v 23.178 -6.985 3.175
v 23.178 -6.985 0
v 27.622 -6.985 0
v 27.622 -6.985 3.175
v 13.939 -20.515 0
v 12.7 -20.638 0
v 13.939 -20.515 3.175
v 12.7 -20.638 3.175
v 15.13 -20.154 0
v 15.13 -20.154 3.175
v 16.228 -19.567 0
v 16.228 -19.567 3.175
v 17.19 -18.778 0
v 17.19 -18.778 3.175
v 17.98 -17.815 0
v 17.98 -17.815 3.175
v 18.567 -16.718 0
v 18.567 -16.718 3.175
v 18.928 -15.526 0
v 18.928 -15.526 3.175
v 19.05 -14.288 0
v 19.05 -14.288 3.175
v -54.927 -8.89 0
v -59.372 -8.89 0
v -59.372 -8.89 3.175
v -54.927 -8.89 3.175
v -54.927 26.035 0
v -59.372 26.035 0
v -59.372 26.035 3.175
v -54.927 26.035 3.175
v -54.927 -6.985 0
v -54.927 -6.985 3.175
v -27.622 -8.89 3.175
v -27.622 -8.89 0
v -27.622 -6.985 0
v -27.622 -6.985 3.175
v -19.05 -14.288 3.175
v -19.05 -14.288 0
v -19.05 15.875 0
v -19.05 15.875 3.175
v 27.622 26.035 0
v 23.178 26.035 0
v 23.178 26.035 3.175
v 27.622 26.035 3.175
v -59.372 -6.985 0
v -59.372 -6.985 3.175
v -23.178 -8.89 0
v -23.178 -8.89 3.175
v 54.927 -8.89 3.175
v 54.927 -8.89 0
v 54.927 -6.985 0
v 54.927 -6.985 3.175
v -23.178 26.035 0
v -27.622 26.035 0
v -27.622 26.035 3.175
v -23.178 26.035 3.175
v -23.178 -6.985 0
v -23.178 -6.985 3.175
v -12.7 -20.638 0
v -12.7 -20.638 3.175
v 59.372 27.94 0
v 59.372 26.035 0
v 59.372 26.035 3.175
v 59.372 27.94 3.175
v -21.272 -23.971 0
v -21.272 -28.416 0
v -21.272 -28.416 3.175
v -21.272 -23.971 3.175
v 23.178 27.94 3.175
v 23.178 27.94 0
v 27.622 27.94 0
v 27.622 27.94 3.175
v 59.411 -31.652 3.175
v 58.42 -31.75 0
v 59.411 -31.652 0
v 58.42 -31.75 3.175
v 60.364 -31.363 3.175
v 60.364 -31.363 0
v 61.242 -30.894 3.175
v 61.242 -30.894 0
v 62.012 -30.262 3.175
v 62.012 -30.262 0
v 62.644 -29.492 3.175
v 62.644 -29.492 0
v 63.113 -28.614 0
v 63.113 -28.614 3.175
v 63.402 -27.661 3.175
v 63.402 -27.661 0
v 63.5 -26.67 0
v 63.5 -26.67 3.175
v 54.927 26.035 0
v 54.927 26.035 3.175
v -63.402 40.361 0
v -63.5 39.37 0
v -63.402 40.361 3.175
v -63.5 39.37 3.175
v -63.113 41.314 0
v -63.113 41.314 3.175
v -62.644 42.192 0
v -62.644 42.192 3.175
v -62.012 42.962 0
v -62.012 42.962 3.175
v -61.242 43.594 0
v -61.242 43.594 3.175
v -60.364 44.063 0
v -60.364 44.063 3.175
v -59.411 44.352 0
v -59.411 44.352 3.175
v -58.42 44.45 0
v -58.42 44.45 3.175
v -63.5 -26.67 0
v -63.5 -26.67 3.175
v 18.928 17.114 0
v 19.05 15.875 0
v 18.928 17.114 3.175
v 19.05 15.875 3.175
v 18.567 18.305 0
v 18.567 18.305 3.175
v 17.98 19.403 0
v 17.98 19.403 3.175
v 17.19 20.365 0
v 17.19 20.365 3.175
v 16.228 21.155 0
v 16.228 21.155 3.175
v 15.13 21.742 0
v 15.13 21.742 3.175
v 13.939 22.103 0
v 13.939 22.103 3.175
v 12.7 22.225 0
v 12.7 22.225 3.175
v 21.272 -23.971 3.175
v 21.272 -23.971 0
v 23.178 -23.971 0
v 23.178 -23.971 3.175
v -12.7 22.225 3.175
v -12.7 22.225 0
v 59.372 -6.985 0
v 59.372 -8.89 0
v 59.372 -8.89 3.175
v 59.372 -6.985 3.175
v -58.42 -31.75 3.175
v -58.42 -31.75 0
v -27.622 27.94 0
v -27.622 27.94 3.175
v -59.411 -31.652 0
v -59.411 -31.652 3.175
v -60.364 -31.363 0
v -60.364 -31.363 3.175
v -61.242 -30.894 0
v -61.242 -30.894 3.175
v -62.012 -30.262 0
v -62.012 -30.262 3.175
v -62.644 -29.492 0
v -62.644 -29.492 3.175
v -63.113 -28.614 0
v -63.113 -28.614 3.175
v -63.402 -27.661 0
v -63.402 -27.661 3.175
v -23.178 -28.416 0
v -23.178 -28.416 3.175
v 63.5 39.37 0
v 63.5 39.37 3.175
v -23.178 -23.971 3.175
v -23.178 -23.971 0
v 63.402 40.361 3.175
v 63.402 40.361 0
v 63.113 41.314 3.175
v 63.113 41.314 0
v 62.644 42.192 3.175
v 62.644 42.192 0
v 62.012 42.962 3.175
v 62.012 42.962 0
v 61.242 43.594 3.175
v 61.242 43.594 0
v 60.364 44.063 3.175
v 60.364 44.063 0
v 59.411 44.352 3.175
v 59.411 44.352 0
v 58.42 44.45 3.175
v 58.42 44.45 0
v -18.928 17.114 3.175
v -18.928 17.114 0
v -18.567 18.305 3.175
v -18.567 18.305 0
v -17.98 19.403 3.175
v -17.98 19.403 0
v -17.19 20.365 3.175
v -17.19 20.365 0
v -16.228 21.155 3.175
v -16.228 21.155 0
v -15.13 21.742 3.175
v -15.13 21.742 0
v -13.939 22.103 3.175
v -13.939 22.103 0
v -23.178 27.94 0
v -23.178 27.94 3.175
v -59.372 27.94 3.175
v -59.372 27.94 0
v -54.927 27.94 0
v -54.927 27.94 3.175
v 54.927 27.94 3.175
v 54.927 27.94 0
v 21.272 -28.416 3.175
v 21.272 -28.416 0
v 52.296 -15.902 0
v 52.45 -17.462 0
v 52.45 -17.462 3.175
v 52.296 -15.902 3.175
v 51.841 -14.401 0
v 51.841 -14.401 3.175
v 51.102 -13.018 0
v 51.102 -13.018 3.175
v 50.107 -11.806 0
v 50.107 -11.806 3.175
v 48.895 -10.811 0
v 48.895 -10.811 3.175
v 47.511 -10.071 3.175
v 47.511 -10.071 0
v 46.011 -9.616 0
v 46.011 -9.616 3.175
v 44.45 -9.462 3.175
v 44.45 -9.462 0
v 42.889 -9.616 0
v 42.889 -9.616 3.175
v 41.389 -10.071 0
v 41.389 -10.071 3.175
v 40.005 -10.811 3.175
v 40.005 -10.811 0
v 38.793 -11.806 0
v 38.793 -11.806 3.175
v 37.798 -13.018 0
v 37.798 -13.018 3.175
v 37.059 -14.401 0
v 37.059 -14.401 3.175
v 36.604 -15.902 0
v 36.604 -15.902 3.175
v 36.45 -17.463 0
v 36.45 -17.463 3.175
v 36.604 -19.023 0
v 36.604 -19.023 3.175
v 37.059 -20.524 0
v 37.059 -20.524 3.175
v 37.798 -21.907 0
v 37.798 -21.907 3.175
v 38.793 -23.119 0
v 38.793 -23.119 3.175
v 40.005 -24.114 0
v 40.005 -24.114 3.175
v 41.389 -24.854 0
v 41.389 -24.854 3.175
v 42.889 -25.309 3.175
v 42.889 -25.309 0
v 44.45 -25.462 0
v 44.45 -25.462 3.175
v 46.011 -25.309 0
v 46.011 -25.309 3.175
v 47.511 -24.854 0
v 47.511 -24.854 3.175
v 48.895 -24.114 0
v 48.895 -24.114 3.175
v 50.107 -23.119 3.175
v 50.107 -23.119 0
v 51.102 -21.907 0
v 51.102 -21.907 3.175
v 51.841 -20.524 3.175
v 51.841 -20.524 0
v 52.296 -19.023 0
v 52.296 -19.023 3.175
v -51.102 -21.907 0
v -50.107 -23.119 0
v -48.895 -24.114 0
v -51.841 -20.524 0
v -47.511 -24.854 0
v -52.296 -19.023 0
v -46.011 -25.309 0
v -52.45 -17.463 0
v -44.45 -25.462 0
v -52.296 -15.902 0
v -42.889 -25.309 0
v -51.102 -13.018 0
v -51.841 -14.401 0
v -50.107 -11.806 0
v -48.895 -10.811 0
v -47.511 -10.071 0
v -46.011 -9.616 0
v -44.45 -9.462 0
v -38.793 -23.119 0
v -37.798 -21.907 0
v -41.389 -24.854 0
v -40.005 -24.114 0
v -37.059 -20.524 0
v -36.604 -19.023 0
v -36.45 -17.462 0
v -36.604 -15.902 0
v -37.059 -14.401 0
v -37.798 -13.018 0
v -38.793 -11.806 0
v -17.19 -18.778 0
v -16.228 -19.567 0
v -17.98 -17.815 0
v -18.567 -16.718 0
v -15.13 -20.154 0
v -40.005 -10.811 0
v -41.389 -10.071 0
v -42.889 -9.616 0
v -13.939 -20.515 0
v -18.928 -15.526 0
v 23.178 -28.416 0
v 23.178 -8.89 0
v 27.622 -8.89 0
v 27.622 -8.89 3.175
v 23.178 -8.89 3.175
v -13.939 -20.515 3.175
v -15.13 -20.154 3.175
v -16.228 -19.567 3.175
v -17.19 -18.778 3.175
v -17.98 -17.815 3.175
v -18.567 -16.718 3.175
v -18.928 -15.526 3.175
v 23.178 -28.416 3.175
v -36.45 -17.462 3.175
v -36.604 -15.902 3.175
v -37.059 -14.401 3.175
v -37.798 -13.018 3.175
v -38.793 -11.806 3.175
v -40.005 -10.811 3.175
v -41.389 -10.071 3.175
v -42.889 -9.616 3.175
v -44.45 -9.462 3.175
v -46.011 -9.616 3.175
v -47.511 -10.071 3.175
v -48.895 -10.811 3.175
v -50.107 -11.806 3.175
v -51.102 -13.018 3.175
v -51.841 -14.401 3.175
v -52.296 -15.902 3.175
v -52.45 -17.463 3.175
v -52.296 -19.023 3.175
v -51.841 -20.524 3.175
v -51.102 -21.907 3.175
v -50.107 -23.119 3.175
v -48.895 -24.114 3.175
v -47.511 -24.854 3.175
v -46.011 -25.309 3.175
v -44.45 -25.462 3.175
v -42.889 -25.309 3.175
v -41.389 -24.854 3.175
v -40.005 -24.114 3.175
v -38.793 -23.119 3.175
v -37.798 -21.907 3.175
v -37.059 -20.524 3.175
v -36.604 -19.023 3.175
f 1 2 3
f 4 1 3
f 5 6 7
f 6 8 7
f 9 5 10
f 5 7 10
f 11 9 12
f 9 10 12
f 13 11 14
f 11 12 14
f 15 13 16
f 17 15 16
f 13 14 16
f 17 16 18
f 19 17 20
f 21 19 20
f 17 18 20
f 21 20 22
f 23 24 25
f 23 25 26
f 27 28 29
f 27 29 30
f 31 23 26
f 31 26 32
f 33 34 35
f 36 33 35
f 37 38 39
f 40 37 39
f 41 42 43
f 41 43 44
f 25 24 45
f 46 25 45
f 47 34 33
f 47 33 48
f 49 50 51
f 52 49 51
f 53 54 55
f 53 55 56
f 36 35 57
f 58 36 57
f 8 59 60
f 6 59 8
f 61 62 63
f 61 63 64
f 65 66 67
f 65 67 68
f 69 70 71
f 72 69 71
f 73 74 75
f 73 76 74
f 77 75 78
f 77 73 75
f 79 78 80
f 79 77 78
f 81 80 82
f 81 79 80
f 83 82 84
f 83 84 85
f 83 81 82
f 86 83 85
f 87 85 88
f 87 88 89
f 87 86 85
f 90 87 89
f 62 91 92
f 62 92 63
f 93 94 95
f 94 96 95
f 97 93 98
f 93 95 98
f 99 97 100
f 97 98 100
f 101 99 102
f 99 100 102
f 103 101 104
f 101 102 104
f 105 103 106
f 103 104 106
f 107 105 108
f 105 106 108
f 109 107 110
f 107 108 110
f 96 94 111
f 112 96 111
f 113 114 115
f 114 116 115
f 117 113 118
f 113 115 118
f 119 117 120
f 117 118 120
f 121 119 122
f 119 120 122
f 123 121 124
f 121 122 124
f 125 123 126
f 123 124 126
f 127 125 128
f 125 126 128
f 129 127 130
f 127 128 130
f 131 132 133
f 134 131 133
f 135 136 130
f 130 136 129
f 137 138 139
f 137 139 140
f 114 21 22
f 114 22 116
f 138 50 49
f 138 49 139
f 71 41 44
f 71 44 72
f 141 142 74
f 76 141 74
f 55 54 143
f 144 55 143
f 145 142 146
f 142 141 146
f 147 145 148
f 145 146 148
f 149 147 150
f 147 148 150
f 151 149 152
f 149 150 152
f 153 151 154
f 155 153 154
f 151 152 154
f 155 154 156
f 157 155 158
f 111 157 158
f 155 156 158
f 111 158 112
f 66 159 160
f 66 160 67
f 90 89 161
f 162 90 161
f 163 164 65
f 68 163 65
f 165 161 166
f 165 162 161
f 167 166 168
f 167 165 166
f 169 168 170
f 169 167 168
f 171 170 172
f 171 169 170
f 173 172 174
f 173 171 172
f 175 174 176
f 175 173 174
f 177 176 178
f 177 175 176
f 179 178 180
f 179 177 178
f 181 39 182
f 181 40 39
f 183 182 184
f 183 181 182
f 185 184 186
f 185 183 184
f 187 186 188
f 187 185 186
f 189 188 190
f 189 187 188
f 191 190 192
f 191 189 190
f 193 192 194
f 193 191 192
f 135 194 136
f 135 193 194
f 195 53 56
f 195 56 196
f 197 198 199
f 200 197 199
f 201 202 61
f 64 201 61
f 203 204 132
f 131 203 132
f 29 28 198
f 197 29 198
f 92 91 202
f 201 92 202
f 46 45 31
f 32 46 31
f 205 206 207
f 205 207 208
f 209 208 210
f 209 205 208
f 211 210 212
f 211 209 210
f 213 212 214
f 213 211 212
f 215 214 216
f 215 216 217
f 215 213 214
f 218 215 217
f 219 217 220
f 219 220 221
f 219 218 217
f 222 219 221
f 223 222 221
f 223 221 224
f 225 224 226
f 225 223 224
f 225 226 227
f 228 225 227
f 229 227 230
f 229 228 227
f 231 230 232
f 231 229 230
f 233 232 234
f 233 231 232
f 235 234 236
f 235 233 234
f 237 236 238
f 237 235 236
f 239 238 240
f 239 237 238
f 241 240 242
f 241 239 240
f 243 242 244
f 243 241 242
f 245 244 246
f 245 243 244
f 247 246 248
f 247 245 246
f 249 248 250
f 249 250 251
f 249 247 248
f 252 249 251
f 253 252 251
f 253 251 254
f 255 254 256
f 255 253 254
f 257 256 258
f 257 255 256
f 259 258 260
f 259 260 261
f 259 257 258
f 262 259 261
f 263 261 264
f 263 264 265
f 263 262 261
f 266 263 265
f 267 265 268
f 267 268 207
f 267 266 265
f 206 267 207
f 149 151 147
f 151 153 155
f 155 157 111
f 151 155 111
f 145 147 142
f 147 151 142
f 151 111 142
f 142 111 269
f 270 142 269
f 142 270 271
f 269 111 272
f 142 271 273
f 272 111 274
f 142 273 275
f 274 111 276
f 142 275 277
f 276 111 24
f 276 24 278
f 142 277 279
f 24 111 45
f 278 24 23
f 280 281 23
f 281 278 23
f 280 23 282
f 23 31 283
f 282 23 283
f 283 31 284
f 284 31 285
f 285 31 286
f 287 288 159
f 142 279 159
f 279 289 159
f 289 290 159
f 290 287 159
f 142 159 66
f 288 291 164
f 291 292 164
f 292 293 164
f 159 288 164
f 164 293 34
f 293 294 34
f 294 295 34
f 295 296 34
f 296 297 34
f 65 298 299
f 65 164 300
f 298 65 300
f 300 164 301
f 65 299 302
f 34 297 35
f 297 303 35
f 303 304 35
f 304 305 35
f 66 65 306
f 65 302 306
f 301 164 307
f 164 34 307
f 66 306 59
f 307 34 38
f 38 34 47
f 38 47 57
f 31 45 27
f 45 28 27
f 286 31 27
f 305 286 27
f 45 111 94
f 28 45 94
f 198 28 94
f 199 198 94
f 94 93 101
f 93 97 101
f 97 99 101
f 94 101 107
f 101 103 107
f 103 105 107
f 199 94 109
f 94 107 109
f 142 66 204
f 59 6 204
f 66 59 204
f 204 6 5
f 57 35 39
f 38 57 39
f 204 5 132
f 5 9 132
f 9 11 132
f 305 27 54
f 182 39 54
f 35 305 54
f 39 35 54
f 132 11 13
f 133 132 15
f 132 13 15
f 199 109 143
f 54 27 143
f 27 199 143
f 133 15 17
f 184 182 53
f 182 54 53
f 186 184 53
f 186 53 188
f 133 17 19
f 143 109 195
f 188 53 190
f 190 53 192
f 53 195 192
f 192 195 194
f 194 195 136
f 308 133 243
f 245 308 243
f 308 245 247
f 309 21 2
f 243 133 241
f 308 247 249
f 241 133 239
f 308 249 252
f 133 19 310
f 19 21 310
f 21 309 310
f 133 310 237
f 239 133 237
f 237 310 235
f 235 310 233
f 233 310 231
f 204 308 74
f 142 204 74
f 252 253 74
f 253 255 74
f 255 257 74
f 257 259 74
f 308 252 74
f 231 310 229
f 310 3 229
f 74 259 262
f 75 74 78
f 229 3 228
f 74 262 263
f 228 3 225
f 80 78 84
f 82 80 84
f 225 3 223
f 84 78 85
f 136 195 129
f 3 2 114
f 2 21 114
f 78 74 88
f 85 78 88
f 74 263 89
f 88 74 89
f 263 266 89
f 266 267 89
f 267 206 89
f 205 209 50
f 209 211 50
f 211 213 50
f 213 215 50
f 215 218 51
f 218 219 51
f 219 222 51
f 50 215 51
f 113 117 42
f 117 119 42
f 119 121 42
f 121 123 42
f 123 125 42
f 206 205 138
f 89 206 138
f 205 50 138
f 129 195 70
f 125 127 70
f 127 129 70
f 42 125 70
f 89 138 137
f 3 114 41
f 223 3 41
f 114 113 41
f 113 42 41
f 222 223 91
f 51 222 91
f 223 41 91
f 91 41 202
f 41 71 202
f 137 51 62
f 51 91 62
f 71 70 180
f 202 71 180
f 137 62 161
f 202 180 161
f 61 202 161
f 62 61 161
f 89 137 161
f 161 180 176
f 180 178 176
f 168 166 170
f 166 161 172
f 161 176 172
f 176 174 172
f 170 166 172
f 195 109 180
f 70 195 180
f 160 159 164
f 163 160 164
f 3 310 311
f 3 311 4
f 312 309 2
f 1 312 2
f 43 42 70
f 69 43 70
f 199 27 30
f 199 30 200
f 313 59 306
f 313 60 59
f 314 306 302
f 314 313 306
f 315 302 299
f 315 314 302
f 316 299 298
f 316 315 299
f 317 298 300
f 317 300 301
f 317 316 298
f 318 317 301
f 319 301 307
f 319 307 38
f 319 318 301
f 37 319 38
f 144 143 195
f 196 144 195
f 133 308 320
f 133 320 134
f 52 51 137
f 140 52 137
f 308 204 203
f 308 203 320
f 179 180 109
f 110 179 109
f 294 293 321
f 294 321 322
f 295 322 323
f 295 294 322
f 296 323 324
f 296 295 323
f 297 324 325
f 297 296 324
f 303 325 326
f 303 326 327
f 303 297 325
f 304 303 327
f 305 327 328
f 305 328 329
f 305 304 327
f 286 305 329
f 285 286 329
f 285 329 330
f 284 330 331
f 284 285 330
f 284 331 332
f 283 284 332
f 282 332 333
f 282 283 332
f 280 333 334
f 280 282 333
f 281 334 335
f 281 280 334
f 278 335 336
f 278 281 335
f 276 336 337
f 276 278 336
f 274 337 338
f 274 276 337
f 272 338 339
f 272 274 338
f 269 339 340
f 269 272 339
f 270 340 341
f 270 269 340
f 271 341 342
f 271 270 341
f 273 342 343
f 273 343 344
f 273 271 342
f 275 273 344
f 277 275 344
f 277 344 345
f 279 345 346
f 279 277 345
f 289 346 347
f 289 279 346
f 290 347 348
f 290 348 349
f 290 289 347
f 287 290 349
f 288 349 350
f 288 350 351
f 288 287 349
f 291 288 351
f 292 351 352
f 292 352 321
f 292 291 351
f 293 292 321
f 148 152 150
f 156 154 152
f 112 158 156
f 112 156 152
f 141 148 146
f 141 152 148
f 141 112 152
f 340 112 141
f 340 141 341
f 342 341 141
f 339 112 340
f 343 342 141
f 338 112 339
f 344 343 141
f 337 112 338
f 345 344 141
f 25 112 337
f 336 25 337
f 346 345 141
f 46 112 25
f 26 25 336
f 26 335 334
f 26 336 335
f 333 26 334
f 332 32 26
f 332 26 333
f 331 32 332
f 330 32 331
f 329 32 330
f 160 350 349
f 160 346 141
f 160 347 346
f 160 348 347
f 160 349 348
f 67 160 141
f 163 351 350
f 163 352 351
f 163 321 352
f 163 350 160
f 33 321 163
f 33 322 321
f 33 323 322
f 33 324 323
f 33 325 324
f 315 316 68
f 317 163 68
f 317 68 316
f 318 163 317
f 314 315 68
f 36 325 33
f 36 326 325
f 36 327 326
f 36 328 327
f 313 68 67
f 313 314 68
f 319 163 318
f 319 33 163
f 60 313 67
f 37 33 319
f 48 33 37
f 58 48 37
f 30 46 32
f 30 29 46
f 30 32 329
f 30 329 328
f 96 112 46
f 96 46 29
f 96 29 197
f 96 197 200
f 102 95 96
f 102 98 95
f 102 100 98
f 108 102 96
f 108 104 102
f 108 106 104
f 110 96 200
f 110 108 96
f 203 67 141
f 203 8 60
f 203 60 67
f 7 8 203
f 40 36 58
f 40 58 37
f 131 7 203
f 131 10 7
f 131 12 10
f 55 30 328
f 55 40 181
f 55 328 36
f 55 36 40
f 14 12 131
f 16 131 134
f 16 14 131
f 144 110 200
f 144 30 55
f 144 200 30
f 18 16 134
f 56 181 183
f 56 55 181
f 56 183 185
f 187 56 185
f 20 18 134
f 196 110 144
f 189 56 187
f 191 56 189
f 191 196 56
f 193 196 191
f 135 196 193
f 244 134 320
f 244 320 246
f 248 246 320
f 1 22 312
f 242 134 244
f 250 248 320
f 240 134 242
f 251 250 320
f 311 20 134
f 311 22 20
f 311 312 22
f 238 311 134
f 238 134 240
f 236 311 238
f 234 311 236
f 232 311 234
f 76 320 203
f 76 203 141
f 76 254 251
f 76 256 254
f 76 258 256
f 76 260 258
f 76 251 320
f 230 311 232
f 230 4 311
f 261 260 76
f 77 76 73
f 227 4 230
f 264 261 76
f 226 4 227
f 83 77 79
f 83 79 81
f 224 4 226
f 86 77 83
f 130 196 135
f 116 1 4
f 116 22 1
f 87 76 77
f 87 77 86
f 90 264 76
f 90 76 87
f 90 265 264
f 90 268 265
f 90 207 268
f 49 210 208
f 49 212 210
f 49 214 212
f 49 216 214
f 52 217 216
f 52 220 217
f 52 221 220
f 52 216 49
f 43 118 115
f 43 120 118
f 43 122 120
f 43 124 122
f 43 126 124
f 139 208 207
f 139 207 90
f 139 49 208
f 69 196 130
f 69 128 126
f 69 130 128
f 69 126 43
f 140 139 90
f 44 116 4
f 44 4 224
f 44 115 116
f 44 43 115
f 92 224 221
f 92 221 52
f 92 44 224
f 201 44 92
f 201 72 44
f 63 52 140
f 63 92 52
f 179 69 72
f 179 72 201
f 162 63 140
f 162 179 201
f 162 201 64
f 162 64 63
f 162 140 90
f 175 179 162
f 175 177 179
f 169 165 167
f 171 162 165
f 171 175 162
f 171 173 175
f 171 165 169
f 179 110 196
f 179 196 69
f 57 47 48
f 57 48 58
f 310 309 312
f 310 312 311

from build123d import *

# Parameters (mm, degrees)
F0_R     = 8
F0_W     = 1.905
F0_H     = 4.445
F0_W_2   = 4.445
F0_H_2   = 1.905
F0_W_3   = 38.1
F0_H_3   = 42.8625
F1_DEPTH = 3.175
F2_R     = 6.35
F3_R     = 5.08


with BuildPart() as f1:
    # F0 (on Top) → F1 (new body)
    with BuildSketch(Plane.XY):
        Polygon((-63.5, -31.75), (63.5, -31.75), (63.5, 31.75), (63.5, 44.45), (-63.5, 44.45), (-63.5, 31.75), align=None)
        with Locations((-44.45, -17.4625)):
            Circle(F0_R, mode=Mode.SUBTRACT)
        with Locations((-22.225, -26.19375)):
            Rectangle(F0_W, F0_H, mode=Mode.SUBTRACT)
        with Locations((-57.15, -7.9375)):
            Rectangle(F0_W_2, F0_H_2, mode=Mode.SUBTRACT)
        with Locations((-25.4, -7.9375)):
            Rectangle(F0_W_2, F0_H_2, mode=Mode.SUBTRACT)
        with Locations((22.225, -26.19375)):
            Rectangle(F0_W, F0_H, mode=Mode.SUBTRACT)
        with Locations((44.45, -17.4625)):
            Circle(F0_R, mode=Mode.SUBTRACT)
        with Locations((25.4, -7.9375)):
            Rectangle(F0_W_2, F0_H_2, mode=Mode.SUBTRACT)
        with Locations((0, 0.79375)):
            Rectangle(F0_W_3, F0_H_3, mode=Mode.SUBTRACT)
        with Locations((57.15, -7.9375)):
            Rectangle(F0_W_2, F0_H_2, mode=Mode.SUBTRACT)
        with Locations((-57.15, 26.9875)):
            Rectangle(F0_W_2, F0_H_2, mode=Mode.SUBTRACT)
        with Locations((-25.4, 26.9875)):
            Rectangle(F0_W_2, F0_H_2, mode=Mode.SUBTRACT)
        with Locations((25.4, 26.9875)):
            Rectangle(F0_W_2, F0_H_2, mode=Mode.SUBTRACT)
        with Locations((57.15, 26.9875)):
            Rectangle(F0_W_2, F0_H_2, mode=Mode.SUBTRACT)
    extrude(amount=F1_DEPTH)

    # F2
    f2_edges = [f1.edges().sort_by_distance(p)[0] for p in [
        (-19.05, 22.225, 1.5875),
        (19.05, 22.225, 1.5875),
        (-19.05, -20.6375, 1.5875),
        (19.05, -20.6375, 1.5875),
    ]]
    fillet(f2_edges, radius=F2_R)

    # F3
    f3_edges = [f1.edges().sort_by_distance(p)[0] for p in [
        (-63.5, 44.45, 1.5875),
        (-63.5, -31.75, 1.5875),
        (63.5, -31.75, 1.5875),
        (63.5, 44.45, 1.5875),
    ]]
    fillet(f3_edges, radius=F3_R)


solid = f1.part
